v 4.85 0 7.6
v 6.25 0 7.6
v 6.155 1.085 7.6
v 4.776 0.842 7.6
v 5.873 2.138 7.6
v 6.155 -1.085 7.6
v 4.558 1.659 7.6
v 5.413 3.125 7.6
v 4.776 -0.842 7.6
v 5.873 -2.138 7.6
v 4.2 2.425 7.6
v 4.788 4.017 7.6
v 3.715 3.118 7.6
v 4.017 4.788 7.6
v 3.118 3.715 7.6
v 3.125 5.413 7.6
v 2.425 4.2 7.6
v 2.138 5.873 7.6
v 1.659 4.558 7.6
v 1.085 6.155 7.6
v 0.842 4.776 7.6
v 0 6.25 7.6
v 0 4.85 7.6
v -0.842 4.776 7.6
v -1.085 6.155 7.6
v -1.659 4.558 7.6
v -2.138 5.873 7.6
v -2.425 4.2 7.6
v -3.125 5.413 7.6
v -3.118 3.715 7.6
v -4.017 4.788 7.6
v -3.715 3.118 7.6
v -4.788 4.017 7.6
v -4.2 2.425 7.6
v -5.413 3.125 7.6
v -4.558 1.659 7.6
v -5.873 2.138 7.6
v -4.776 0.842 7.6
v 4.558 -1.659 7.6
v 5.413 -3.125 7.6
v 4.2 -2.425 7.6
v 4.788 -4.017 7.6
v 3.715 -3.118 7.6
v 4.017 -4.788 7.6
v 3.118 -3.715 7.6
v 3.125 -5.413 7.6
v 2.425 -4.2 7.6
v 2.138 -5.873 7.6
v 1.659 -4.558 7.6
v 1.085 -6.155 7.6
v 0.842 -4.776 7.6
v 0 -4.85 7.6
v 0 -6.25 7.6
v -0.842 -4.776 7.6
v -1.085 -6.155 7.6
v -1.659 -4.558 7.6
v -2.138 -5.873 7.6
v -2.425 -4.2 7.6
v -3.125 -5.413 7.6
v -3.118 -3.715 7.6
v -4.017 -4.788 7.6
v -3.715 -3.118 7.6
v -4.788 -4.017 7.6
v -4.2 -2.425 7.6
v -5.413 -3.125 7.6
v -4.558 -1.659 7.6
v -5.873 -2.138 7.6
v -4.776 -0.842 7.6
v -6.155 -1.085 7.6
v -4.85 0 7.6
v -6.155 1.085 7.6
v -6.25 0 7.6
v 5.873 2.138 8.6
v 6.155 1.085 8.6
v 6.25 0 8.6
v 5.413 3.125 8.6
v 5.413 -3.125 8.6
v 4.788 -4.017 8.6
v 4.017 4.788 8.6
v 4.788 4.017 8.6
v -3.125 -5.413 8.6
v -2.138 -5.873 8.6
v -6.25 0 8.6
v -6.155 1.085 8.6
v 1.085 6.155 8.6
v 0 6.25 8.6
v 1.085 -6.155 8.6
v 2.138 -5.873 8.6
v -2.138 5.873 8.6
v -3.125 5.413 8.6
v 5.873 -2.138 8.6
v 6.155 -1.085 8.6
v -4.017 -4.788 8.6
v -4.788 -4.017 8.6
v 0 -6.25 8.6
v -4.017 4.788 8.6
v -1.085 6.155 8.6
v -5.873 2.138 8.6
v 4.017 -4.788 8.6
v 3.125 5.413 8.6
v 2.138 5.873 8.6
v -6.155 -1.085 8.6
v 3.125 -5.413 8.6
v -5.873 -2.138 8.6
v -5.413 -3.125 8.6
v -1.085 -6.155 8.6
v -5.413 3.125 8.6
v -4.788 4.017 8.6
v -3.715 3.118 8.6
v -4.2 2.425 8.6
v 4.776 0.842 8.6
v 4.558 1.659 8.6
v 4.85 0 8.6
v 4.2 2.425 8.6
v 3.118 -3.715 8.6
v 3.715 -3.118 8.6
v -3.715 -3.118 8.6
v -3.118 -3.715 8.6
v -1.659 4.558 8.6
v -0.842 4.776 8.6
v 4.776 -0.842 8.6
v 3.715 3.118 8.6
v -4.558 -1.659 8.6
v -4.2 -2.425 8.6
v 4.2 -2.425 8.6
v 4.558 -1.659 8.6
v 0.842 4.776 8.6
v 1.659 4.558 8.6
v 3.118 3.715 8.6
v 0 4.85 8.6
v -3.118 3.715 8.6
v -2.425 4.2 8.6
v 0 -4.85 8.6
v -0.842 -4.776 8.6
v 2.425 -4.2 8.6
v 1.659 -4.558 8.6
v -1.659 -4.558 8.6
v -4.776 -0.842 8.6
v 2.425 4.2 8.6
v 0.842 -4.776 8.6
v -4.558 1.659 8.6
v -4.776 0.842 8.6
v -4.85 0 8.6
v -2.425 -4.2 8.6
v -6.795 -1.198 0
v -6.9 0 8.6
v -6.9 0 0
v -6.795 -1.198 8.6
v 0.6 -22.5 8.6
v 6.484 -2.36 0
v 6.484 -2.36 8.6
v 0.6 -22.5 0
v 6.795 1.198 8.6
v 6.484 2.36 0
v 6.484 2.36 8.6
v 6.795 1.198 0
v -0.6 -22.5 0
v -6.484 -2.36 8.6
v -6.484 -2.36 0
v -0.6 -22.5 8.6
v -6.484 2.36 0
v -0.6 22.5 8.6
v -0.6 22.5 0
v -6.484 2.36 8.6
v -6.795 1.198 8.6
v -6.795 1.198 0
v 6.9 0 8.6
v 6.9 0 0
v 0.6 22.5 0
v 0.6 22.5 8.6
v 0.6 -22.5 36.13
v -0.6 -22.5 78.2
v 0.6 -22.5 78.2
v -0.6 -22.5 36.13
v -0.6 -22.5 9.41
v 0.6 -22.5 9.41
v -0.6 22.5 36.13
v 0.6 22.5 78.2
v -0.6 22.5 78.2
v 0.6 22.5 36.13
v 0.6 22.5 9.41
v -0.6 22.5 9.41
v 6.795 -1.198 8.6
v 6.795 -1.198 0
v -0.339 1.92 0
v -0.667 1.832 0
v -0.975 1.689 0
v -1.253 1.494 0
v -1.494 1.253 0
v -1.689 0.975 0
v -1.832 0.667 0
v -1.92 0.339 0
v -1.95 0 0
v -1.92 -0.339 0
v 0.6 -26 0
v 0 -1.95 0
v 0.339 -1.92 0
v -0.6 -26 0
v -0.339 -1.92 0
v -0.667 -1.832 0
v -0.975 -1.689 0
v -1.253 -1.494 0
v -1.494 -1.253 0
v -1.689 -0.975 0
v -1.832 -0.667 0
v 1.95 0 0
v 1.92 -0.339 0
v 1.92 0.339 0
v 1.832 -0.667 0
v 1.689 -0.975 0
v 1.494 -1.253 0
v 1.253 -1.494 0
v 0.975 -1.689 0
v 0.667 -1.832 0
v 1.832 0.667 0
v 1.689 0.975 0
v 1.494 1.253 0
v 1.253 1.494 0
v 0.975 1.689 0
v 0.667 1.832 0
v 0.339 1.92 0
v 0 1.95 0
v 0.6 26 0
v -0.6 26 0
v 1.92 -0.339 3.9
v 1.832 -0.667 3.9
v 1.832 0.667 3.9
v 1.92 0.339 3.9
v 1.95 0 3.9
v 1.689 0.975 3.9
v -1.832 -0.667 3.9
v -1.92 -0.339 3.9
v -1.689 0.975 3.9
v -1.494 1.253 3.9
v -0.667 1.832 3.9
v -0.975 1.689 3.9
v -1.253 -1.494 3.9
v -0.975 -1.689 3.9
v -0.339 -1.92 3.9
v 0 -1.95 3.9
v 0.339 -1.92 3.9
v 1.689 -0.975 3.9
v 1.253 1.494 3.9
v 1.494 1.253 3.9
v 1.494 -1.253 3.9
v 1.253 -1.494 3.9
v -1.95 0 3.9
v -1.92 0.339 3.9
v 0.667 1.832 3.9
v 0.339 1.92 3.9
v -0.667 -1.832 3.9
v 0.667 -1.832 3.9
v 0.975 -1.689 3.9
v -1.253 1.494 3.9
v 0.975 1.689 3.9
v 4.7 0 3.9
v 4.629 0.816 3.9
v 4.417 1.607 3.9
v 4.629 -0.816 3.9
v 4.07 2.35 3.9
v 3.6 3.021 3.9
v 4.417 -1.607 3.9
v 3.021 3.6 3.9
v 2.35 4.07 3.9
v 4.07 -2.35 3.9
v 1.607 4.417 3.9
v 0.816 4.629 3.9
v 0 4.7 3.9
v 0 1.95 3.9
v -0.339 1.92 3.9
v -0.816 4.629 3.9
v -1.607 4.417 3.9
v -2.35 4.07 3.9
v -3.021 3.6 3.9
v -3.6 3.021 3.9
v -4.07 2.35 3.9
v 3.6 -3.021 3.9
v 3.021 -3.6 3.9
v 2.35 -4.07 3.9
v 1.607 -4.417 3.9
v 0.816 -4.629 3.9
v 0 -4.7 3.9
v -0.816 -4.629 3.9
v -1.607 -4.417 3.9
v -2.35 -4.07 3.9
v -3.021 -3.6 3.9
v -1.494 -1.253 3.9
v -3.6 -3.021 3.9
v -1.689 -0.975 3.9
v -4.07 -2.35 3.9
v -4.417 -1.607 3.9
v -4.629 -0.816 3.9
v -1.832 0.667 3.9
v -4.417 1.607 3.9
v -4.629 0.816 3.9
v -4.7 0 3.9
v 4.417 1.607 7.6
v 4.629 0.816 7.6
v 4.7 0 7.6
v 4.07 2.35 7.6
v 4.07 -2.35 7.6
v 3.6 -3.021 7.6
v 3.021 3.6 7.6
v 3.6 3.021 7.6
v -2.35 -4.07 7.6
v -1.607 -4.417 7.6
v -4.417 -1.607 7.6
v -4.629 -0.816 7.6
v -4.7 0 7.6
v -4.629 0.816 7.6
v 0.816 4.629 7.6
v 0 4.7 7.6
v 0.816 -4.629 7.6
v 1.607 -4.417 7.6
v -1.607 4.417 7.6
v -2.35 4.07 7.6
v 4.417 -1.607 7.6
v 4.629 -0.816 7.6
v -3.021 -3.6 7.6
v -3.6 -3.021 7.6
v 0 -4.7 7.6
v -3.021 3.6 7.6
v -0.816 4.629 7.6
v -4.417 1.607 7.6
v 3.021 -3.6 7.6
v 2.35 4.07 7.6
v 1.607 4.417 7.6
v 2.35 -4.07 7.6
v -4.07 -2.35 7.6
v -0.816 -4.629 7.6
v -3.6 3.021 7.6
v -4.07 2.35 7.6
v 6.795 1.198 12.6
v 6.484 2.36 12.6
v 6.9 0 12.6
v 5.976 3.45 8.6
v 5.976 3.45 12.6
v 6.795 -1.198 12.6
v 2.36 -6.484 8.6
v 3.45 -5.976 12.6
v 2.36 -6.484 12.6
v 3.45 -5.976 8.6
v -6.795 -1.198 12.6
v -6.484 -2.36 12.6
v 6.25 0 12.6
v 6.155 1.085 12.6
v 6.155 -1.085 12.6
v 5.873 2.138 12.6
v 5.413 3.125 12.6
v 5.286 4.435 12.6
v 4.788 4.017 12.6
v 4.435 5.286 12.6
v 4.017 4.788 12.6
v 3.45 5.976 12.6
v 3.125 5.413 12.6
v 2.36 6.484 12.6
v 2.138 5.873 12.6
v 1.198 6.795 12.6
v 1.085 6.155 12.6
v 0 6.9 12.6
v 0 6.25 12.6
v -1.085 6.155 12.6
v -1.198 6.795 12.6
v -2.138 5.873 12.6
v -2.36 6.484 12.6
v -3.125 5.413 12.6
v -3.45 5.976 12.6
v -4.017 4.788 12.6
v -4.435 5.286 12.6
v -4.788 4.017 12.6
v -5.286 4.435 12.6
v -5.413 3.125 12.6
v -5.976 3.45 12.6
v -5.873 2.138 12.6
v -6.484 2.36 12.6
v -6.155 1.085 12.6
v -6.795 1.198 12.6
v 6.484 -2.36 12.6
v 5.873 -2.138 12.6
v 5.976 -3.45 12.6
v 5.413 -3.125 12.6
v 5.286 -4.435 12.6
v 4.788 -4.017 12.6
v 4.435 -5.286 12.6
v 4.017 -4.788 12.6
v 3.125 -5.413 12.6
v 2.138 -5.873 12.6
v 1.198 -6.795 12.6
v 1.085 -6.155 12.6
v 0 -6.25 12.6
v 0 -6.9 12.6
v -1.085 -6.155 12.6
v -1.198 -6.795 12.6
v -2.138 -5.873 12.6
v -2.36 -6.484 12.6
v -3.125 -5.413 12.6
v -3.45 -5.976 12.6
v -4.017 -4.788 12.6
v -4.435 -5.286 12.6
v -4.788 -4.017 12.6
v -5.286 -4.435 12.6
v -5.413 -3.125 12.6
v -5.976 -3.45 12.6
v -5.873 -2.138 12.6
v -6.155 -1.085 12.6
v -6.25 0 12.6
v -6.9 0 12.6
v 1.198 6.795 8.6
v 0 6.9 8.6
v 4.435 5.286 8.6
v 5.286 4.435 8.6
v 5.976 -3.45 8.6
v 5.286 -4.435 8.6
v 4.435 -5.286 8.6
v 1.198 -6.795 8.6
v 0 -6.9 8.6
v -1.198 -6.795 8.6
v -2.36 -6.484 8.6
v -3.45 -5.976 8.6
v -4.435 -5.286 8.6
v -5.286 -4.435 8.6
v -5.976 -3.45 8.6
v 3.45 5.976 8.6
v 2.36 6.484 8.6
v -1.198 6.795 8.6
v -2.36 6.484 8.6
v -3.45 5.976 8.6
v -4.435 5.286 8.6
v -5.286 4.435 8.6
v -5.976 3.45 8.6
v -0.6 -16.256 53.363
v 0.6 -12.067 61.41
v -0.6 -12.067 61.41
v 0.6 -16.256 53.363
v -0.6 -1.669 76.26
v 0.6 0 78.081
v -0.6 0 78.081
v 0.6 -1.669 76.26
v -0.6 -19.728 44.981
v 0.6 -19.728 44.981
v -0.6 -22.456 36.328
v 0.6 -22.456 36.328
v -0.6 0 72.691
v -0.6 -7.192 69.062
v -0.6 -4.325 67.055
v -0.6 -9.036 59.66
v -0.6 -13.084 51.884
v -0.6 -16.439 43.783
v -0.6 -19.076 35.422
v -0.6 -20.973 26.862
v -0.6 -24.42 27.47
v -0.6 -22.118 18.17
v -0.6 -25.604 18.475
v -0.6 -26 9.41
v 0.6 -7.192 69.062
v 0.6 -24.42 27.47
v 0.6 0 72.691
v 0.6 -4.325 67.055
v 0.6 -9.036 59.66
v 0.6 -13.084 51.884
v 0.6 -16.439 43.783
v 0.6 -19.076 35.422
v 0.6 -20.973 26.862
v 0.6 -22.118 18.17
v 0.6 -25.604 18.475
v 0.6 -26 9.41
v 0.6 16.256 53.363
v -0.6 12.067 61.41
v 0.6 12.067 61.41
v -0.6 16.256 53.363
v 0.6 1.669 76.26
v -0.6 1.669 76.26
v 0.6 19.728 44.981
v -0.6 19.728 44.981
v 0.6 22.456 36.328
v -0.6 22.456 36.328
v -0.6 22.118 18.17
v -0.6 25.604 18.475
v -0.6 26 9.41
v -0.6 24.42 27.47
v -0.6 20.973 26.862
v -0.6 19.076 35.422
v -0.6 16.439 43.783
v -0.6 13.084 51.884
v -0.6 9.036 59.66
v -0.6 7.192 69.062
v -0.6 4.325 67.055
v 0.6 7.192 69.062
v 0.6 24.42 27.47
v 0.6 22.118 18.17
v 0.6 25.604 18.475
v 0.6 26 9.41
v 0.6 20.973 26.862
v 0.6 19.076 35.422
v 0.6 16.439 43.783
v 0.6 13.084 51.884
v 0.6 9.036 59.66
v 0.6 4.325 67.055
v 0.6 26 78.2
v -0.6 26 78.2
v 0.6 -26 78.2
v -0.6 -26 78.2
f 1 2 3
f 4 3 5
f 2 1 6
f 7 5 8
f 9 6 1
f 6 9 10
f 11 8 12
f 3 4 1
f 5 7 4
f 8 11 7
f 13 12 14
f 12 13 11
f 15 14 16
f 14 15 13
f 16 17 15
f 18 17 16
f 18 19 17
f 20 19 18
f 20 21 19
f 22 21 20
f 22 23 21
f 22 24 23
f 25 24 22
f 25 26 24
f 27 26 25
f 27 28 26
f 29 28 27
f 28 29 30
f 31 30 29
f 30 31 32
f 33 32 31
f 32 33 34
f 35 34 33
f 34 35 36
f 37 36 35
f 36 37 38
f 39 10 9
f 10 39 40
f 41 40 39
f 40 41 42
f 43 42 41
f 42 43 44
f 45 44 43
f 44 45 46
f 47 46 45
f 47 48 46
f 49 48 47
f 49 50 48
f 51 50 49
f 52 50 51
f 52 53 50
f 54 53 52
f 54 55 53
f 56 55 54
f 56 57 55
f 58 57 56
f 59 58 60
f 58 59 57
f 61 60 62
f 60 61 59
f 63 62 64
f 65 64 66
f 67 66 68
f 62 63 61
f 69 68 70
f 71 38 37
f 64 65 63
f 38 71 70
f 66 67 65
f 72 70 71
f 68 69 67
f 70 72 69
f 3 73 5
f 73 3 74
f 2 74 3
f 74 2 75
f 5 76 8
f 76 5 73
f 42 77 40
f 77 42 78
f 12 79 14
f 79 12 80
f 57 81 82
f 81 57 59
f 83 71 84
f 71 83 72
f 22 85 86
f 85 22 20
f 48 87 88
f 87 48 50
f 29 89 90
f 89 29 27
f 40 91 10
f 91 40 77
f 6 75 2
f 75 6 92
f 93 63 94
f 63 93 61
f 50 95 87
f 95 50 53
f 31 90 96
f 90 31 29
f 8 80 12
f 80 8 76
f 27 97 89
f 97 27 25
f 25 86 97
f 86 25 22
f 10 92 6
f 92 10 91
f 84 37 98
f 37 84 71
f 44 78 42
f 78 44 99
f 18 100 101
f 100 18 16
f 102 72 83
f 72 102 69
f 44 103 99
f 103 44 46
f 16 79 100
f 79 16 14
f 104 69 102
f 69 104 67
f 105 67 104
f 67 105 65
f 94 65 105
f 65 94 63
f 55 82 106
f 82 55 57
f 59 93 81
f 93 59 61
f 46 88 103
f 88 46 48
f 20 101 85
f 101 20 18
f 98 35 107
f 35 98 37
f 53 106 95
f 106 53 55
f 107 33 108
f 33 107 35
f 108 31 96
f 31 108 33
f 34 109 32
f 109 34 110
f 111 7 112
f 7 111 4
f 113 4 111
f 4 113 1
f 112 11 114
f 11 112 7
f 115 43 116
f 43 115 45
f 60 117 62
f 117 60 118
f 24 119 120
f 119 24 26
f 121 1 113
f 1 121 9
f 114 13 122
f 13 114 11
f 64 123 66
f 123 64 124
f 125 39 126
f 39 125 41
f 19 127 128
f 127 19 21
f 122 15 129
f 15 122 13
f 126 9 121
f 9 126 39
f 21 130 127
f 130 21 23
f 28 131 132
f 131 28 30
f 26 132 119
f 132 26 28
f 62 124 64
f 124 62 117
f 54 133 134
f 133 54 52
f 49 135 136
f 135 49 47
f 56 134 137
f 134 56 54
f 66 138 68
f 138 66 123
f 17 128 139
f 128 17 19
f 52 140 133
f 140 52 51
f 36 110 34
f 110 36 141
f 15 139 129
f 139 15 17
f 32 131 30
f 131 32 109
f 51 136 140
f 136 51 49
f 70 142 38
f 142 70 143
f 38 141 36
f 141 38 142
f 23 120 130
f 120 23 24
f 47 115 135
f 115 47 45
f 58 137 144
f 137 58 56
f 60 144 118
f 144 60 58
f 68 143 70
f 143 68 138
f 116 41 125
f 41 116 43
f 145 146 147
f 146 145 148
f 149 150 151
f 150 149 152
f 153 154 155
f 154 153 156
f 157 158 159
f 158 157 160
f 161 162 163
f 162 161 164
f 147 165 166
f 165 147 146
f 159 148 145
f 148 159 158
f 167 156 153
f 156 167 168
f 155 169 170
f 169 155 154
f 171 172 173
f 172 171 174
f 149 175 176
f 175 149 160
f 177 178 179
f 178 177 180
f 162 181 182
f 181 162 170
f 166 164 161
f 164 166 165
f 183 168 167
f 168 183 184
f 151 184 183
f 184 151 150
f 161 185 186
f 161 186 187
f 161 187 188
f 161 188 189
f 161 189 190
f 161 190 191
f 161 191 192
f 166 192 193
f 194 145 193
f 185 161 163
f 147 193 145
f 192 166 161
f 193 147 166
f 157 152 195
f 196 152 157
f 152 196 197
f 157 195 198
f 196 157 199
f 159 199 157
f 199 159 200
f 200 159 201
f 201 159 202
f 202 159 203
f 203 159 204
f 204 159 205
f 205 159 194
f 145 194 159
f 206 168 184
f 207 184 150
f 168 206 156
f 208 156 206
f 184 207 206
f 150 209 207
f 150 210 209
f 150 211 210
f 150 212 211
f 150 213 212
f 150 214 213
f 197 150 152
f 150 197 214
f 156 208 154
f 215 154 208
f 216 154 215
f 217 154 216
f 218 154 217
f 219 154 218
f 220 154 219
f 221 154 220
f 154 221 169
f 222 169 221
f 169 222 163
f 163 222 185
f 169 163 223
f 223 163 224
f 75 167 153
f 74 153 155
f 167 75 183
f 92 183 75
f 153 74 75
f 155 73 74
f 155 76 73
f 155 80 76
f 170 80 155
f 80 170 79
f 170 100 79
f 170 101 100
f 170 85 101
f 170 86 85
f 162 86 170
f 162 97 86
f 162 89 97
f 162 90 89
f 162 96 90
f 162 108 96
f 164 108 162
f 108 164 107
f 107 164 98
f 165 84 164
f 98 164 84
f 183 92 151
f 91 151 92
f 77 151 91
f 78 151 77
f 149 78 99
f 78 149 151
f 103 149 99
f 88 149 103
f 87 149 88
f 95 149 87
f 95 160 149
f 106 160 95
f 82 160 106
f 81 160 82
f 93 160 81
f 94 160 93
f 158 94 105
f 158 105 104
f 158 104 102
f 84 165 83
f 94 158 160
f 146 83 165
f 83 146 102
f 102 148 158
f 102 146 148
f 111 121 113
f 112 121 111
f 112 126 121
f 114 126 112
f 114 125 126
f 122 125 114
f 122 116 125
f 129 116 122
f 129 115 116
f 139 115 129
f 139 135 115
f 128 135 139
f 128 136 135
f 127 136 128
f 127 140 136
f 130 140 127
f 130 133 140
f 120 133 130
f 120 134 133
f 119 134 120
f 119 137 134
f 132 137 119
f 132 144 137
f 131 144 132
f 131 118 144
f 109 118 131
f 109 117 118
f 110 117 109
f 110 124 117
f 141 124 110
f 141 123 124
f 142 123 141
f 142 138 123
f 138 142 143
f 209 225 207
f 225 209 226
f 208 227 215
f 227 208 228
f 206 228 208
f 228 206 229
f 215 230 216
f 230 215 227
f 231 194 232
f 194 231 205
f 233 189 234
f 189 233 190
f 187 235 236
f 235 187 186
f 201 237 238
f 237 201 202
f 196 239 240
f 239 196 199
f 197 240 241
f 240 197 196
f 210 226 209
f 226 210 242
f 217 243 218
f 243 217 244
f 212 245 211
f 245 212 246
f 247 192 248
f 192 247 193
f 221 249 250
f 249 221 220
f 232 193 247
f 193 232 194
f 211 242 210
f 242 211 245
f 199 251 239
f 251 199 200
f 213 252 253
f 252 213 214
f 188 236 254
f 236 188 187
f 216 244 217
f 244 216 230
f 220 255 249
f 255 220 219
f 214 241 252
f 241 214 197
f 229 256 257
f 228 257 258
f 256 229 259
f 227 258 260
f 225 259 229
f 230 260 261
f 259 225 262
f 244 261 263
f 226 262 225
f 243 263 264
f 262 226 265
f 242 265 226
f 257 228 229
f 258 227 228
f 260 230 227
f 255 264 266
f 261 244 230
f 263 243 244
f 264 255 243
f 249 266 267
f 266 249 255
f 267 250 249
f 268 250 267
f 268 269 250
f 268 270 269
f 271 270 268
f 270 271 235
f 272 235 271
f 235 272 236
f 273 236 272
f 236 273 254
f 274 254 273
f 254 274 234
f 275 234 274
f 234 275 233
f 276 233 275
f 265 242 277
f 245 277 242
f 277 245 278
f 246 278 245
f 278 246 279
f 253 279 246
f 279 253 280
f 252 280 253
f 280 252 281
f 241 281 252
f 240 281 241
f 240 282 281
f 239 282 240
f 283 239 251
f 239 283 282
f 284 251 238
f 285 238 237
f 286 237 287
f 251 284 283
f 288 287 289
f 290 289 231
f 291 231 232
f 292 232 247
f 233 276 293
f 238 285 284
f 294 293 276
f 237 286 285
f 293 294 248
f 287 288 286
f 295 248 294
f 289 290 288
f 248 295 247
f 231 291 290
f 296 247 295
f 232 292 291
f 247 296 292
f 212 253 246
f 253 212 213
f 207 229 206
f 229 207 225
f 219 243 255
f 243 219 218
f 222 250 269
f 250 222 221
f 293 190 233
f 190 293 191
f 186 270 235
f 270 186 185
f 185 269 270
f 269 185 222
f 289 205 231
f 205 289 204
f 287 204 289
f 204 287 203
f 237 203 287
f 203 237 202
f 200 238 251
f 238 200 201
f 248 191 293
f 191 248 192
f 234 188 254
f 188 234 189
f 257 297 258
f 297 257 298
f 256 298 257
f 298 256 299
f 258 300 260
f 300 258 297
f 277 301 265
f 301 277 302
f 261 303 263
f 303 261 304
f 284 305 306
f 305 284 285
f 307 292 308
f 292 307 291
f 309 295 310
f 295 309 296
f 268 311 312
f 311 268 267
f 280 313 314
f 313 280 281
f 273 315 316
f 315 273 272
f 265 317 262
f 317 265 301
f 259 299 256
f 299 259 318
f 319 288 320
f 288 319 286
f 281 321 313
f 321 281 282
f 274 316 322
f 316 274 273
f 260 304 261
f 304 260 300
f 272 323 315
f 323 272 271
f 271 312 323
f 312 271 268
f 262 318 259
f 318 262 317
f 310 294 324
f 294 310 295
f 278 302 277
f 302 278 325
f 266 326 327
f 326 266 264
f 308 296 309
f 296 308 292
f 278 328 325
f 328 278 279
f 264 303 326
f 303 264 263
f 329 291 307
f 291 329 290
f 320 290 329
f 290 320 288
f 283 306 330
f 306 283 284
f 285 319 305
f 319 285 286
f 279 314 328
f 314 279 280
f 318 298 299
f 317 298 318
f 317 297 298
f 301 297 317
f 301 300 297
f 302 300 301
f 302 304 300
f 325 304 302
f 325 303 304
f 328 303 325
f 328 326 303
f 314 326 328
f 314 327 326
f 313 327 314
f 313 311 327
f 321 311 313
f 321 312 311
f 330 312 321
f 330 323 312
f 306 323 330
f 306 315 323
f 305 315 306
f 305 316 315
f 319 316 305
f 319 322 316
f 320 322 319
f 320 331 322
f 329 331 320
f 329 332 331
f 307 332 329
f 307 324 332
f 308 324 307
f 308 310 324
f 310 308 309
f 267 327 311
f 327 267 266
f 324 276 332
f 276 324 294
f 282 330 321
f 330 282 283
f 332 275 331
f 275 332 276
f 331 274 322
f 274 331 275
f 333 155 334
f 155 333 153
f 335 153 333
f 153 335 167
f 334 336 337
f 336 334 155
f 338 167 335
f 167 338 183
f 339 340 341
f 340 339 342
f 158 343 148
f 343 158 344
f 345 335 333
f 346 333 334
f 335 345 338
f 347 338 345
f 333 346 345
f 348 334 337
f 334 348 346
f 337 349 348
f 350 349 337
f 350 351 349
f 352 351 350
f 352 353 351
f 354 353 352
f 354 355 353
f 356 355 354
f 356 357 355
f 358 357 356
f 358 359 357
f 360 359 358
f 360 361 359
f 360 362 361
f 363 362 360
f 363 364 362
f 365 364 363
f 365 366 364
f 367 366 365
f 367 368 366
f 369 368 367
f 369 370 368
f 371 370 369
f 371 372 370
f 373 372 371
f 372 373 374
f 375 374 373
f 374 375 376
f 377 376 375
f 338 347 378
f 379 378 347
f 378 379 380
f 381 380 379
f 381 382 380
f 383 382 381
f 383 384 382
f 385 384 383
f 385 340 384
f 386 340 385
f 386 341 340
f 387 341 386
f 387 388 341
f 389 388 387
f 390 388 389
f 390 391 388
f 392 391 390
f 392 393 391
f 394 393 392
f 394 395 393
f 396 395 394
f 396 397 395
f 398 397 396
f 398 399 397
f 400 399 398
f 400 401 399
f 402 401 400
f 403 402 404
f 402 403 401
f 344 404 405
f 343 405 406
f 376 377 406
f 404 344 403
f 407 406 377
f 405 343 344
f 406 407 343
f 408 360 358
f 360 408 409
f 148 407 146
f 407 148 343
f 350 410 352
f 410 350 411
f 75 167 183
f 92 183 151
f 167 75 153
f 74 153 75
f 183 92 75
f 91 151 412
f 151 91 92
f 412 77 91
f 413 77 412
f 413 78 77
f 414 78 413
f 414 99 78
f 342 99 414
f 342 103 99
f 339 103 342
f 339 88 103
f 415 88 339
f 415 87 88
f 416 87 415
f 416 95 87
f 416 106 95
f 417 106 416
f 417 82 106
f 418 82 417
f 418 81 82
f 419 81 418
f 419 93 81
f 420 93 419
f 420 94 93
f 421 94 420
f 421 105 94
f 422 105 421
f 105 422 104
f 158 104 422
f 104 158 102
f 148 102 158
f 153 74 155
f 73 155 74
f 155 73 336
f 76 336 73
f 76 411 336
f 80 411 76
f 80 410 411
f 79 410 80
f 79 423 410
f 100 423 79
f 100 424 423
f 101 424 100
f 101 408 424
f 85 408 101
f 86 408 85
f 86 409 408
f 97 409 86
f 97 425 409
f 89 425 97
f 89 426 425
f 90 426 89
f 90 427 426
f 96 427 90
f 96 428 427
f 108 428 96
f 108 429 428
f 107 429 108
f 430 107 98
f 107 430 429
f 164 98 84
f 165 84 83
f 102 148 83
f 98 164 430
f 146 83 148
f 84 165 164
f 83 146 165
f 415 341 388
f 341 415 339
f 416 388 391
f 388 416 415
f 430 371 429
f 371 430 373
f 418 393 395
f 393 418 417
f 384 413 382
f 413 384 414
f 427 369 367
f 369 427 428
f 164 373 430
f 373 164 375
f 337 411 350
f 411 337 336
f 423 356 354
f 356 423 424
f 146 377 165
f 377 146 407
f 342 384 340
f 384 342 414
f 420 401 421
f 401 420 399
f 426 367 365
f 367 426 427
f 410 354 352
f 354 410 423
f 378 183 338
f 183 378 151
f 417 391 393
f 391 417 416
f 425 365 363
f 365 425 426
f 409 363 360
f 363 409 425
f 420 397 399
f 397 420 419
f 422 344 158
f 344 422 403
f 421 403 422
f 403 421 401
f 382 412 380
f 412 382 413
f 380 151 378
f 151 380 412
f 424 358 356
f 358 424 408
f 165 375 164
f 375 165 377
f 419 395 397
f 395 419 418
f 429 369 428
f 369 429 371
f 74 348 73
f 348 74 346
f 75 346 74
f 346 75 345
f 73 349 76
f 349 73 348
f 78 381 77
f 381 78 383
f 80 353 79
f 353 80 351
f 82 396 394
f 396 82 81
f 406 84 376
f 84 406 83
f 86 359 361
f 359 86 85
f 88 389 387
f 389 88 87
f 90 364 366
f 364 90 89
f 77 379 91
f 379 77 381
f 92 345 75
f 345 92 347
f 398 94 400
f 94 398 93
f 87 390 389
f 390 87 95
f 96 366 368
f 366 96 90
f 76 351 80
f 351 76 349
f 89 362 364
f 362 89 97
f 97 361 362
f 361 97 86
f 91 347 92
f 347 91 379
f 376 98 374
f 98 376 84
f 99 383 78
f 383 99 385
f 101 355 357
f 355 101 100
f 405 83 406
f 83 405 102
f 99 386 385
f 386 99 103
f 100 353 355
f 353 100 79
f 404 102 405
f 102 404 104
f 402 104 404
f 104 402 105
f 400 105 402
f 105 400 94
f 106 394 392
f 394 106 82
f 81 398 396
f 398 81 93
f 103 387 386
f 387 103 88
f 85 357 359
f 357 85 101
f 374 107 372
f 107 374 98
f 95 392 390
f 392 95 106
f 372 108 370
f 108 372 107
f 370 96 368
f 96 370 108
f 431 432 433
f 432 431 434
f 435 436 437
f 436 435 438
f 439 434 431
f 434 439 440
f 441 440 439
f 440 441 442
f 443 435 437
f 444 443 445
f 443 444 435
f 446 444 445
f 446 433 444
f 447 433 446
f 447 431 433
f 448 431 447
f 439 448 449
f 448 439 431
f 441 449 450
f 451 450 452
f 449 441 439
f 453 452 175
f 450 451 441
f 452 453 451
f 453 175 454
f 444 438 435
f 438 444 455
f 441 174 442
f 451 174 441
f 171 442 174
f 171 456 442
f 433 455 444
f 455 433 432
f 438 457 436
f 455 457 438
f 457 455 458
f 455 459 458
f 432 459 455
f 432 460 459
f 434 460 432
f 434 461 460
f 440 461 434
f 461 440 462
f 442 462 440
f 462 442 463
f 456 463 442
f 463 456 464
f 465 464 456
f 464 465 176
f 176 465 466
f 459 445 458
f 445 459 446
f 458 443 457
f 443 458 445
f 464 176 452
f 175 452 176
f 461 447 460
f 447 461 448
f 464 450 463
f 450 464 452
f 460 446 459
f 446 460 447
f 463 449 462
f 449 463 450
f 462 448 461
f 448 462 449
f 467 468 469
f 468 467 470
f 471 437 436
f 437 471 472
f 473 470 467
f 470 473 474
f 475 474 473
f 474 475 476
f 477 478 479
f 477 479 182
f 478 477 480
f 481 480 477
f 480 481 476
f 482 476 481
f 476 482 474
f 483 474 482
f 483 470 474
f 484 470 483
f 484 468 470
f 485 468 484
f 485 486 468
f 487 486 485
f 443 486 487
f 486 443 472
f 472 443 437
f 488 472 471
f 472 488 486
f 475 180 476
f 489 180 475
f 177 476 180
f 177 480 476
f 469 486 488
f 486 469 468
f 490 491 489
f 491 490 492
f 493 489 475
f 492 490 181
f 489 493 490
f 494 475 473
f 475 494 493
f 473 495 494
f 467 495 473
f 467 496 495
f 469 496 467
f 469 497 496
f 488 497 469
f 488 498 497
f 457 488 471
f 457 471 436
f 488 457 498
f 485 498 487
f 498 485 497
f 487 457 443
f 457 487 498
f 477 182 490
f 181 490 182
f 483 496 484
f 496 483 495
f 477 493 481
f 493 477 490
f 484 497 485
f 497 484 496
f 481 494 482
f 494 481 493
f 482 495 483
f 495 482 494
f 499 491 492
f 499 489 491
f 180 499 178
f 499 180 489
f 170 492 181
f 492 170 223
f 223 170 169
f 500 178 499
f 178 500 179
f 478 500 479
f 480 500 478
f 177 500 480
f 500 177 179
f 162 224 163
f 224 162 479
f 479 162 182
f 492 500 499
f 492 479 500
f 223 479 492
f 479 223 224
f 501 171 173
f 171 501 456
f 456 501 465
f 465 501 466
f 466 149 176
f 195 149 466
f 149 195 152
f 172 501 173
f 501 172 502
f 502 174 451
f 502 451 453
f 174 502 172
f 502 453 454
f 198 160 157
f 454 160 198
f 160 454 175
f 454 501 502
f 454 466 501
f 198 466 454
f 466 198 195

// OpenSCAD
// Design and code by Josh Werblin (https://www.thingiverse.com/jwerblin/designs)

// Magnet/Pin Capillary Holder for SBC X-Ray Crystallography Beam-line

//2017-08-17: First design --JW

//  Use your printing software to find out the last layer where the top is open and pause the print on that layer. Once paused, push the magnet into place and then continue print.

// This can be printed with or without the groove.

//  This can also be printed with an open bottom so you can push in the magnet from the bottom. If you want this, turn "Embedded" to false. If you do this, you may still want to stop the print and place the magnet in place as a way to hold up the plastic, as most printers can't print a flat cover over an empty cylinder hole. You may also want to make the MagnetShellRadiusTol a bit bigger to be able to slide in and out the magnet. With default settings it is pretty snug.


// PRO-TIPS:
// -Use your software to manually move the print head away from the print when it is paused so you do not melt the print.
// -Keep the magnet on the print-bed so it heats up and can be printed on more easily
// -My printer struggled to print onto the magnet, so be prepared to stick a poker of some sort (I used metal forceps) to squish down the hot plastic over the magnet for the first couple layers over it. This will likely mess up your groove, so you may want to set "Groove" to "false".

// VARIABLES:

// Size of nozzle
SizeOfNozzle = 0.4; // size of nozzle

// Things you may want to customize
Embedded = true;
Groove = true;
TotalFrameWidth = 52; // 52 mm
TotalFrameHeight = 78.2; // 78.2 mm
ColumnWidth = 3.5; // 3.5 mm
FrameThicknessInLayers = 3; // 3 layers
$fn = 36; // Minimum number of sides for all circles except arches


// Things you probably want to keep the same
MagnetShellRadius = 4.7; // 4.7 mm
MagnetShellRadiusTol = 0; // 0 mm
MagnetStemRadius = 1.75; // 1.75 mm
MagnetStemRadiusTol = 0.2; // 0.2 mm

MagnetTotalHeight = 7.4; // 7.4 mm
MagnetThickness = 3.5; // 3.5 mm
MagnetThicknessTol = 0.2; // 0.2 mm
MagnetStemHeight = MagnetTotalHeight - MagnetThickness; // 3.9 mm

PinOuterRadius = 5.9; // 5.9 mm
PinInnerRadius = 4.85; // 4.85 mm 
PinGrooveWidthTol = 0.35; // 0.35 mm
PinGrooveDepth = 1; // 1 mm
PinHolderWallHeight = 4; // 4 mm

MagnetHolderWall = 1; // 1 mm (the wall space around the magnet)
PinMagnetGapInLayers = 3; // 3 layers (# of layers that covers magnet. Groove is cut into this 



//////////////////////////////////////////
FrameThickness = FrameThicknessInLayers * SizeOfNozzle;
PinMagnetGap = PinMagnetGapInLayers * SizeOfNozzle;
PinHolderWallThick = (PinOuterRadius+MagnetHolderWall) - (PinOuterRadius+PinGrooveWidthTol);
//////////////////////////////////////////


if (Embedded == false){
        base(MagnetShellRadius+MagnetShellRadiusTol);
    }
    else{
        base(MagnetStemRadius+MagnetStemRadiusTol);
    }
    
arch();
mirror([0,1,0]) arch();
columns();


module base(Hole){
    difference(){
        hull(){
             cylinder( r = PinOuterRadius + MagnetHolderWall, h = MagnetTotalHeight + PinMagnetGap );
             translate([-FrameThickness/2,PinOuterRadius+MagnetHolderWall,0]){
                cube([FrameThickness, TotalFrameWidth/2-PinOuterRadius-MagnetHolderWall-ColumnWidth, MagnetTotalHeight + PinMagnetGap]);
             }
             mirror([0,1,0]){
                 translate([-FrameThickness/2,PinOuterRadius+MagnetHolderWall,0]){
                cube([FrameThickness, TotalFrameWidth/2-PinOuterRadius-MagnetHolderWall-ColumnWidth, MagnetTotalHeight + PinMagnetGap]);
                }
            }
        }
        
        cylinder( r = Hole, h = MagnetStemHeight);
        translate([0,0,MagnetStemHeight]){
            cylinder( r = MagnetShellRadius+MagnetShellRadiusTol, h = MagnetThickness + MagnetThicknessTol );
        }
        if (Groove==true){
            translate([0,0,MagnetTotalHeight+PinMagnetGap-PinGrooveDepth]){    
                difference(){
                    cylinder( r = PinOuterRadius+PinGrooveWidthTol, h = PinGrooveDepth );
                    cylinder( r = PinInnerRadius, h = PinGrooveDepth );
                }
            }
        }
    }
    
    translate([0,0,MagnetTotalHeight+PinMagnetGap]){
        difference(){
            cylinder( r = PinOuterRadius+PinGrooveWidthTol+PinHolderWallThick, h = PinHolderWallHeight );
        cylinder( r = PinOuterRadius+PinGrooveWidthTol, h = PinHolderWallHeight );
        }
    }
}

module columns(){
    translate([-FrameThickness/2, TotalFrameWidth/2-ColumnWidth,0]){
        cube([FrameThickness, ColumnWidth, TotalFrameHeight]);
    }
    mirror([0,1,0]){
        translate([-FrameThickness/2, TotalFrameWidth/2-ColumnWidth,0]){
        cube([FrameThickness, ColumnWidth, TotalFrameHeight]);
        }
    }
}

module arch(){
    translate([-FrameThickness/2,3*TotalFrameWidth/2,TotalFrameHeight-sqrt(pow(2*TotalFrameWidth,2)-pow(3/2*TotalFrameWidth,2))]){
        rotate([0,90,0]){
            difference(){
                cylinder( r = 2*TotalFrameWidth, h = FrameThickness, $fn=72 );
                cylinder( r = 2*TotalFrameWidth-ColumnWidth, h = FrameThickness, $fn=72 );
                translate([0, -2*TotalFrameWidth,0]){
                    cube([2*TotalFrameWidth, 4*TotalFrameWidth, FrameThickness]);
                }
                translate([-2*TotalFrameWidth,-3*TotalFrameWidth/2,0]){
                    cube([2*TotalFrameWidth, 4*TotalFrameWidth, FrameThickness]);
                }
            }
        }
    }
}
